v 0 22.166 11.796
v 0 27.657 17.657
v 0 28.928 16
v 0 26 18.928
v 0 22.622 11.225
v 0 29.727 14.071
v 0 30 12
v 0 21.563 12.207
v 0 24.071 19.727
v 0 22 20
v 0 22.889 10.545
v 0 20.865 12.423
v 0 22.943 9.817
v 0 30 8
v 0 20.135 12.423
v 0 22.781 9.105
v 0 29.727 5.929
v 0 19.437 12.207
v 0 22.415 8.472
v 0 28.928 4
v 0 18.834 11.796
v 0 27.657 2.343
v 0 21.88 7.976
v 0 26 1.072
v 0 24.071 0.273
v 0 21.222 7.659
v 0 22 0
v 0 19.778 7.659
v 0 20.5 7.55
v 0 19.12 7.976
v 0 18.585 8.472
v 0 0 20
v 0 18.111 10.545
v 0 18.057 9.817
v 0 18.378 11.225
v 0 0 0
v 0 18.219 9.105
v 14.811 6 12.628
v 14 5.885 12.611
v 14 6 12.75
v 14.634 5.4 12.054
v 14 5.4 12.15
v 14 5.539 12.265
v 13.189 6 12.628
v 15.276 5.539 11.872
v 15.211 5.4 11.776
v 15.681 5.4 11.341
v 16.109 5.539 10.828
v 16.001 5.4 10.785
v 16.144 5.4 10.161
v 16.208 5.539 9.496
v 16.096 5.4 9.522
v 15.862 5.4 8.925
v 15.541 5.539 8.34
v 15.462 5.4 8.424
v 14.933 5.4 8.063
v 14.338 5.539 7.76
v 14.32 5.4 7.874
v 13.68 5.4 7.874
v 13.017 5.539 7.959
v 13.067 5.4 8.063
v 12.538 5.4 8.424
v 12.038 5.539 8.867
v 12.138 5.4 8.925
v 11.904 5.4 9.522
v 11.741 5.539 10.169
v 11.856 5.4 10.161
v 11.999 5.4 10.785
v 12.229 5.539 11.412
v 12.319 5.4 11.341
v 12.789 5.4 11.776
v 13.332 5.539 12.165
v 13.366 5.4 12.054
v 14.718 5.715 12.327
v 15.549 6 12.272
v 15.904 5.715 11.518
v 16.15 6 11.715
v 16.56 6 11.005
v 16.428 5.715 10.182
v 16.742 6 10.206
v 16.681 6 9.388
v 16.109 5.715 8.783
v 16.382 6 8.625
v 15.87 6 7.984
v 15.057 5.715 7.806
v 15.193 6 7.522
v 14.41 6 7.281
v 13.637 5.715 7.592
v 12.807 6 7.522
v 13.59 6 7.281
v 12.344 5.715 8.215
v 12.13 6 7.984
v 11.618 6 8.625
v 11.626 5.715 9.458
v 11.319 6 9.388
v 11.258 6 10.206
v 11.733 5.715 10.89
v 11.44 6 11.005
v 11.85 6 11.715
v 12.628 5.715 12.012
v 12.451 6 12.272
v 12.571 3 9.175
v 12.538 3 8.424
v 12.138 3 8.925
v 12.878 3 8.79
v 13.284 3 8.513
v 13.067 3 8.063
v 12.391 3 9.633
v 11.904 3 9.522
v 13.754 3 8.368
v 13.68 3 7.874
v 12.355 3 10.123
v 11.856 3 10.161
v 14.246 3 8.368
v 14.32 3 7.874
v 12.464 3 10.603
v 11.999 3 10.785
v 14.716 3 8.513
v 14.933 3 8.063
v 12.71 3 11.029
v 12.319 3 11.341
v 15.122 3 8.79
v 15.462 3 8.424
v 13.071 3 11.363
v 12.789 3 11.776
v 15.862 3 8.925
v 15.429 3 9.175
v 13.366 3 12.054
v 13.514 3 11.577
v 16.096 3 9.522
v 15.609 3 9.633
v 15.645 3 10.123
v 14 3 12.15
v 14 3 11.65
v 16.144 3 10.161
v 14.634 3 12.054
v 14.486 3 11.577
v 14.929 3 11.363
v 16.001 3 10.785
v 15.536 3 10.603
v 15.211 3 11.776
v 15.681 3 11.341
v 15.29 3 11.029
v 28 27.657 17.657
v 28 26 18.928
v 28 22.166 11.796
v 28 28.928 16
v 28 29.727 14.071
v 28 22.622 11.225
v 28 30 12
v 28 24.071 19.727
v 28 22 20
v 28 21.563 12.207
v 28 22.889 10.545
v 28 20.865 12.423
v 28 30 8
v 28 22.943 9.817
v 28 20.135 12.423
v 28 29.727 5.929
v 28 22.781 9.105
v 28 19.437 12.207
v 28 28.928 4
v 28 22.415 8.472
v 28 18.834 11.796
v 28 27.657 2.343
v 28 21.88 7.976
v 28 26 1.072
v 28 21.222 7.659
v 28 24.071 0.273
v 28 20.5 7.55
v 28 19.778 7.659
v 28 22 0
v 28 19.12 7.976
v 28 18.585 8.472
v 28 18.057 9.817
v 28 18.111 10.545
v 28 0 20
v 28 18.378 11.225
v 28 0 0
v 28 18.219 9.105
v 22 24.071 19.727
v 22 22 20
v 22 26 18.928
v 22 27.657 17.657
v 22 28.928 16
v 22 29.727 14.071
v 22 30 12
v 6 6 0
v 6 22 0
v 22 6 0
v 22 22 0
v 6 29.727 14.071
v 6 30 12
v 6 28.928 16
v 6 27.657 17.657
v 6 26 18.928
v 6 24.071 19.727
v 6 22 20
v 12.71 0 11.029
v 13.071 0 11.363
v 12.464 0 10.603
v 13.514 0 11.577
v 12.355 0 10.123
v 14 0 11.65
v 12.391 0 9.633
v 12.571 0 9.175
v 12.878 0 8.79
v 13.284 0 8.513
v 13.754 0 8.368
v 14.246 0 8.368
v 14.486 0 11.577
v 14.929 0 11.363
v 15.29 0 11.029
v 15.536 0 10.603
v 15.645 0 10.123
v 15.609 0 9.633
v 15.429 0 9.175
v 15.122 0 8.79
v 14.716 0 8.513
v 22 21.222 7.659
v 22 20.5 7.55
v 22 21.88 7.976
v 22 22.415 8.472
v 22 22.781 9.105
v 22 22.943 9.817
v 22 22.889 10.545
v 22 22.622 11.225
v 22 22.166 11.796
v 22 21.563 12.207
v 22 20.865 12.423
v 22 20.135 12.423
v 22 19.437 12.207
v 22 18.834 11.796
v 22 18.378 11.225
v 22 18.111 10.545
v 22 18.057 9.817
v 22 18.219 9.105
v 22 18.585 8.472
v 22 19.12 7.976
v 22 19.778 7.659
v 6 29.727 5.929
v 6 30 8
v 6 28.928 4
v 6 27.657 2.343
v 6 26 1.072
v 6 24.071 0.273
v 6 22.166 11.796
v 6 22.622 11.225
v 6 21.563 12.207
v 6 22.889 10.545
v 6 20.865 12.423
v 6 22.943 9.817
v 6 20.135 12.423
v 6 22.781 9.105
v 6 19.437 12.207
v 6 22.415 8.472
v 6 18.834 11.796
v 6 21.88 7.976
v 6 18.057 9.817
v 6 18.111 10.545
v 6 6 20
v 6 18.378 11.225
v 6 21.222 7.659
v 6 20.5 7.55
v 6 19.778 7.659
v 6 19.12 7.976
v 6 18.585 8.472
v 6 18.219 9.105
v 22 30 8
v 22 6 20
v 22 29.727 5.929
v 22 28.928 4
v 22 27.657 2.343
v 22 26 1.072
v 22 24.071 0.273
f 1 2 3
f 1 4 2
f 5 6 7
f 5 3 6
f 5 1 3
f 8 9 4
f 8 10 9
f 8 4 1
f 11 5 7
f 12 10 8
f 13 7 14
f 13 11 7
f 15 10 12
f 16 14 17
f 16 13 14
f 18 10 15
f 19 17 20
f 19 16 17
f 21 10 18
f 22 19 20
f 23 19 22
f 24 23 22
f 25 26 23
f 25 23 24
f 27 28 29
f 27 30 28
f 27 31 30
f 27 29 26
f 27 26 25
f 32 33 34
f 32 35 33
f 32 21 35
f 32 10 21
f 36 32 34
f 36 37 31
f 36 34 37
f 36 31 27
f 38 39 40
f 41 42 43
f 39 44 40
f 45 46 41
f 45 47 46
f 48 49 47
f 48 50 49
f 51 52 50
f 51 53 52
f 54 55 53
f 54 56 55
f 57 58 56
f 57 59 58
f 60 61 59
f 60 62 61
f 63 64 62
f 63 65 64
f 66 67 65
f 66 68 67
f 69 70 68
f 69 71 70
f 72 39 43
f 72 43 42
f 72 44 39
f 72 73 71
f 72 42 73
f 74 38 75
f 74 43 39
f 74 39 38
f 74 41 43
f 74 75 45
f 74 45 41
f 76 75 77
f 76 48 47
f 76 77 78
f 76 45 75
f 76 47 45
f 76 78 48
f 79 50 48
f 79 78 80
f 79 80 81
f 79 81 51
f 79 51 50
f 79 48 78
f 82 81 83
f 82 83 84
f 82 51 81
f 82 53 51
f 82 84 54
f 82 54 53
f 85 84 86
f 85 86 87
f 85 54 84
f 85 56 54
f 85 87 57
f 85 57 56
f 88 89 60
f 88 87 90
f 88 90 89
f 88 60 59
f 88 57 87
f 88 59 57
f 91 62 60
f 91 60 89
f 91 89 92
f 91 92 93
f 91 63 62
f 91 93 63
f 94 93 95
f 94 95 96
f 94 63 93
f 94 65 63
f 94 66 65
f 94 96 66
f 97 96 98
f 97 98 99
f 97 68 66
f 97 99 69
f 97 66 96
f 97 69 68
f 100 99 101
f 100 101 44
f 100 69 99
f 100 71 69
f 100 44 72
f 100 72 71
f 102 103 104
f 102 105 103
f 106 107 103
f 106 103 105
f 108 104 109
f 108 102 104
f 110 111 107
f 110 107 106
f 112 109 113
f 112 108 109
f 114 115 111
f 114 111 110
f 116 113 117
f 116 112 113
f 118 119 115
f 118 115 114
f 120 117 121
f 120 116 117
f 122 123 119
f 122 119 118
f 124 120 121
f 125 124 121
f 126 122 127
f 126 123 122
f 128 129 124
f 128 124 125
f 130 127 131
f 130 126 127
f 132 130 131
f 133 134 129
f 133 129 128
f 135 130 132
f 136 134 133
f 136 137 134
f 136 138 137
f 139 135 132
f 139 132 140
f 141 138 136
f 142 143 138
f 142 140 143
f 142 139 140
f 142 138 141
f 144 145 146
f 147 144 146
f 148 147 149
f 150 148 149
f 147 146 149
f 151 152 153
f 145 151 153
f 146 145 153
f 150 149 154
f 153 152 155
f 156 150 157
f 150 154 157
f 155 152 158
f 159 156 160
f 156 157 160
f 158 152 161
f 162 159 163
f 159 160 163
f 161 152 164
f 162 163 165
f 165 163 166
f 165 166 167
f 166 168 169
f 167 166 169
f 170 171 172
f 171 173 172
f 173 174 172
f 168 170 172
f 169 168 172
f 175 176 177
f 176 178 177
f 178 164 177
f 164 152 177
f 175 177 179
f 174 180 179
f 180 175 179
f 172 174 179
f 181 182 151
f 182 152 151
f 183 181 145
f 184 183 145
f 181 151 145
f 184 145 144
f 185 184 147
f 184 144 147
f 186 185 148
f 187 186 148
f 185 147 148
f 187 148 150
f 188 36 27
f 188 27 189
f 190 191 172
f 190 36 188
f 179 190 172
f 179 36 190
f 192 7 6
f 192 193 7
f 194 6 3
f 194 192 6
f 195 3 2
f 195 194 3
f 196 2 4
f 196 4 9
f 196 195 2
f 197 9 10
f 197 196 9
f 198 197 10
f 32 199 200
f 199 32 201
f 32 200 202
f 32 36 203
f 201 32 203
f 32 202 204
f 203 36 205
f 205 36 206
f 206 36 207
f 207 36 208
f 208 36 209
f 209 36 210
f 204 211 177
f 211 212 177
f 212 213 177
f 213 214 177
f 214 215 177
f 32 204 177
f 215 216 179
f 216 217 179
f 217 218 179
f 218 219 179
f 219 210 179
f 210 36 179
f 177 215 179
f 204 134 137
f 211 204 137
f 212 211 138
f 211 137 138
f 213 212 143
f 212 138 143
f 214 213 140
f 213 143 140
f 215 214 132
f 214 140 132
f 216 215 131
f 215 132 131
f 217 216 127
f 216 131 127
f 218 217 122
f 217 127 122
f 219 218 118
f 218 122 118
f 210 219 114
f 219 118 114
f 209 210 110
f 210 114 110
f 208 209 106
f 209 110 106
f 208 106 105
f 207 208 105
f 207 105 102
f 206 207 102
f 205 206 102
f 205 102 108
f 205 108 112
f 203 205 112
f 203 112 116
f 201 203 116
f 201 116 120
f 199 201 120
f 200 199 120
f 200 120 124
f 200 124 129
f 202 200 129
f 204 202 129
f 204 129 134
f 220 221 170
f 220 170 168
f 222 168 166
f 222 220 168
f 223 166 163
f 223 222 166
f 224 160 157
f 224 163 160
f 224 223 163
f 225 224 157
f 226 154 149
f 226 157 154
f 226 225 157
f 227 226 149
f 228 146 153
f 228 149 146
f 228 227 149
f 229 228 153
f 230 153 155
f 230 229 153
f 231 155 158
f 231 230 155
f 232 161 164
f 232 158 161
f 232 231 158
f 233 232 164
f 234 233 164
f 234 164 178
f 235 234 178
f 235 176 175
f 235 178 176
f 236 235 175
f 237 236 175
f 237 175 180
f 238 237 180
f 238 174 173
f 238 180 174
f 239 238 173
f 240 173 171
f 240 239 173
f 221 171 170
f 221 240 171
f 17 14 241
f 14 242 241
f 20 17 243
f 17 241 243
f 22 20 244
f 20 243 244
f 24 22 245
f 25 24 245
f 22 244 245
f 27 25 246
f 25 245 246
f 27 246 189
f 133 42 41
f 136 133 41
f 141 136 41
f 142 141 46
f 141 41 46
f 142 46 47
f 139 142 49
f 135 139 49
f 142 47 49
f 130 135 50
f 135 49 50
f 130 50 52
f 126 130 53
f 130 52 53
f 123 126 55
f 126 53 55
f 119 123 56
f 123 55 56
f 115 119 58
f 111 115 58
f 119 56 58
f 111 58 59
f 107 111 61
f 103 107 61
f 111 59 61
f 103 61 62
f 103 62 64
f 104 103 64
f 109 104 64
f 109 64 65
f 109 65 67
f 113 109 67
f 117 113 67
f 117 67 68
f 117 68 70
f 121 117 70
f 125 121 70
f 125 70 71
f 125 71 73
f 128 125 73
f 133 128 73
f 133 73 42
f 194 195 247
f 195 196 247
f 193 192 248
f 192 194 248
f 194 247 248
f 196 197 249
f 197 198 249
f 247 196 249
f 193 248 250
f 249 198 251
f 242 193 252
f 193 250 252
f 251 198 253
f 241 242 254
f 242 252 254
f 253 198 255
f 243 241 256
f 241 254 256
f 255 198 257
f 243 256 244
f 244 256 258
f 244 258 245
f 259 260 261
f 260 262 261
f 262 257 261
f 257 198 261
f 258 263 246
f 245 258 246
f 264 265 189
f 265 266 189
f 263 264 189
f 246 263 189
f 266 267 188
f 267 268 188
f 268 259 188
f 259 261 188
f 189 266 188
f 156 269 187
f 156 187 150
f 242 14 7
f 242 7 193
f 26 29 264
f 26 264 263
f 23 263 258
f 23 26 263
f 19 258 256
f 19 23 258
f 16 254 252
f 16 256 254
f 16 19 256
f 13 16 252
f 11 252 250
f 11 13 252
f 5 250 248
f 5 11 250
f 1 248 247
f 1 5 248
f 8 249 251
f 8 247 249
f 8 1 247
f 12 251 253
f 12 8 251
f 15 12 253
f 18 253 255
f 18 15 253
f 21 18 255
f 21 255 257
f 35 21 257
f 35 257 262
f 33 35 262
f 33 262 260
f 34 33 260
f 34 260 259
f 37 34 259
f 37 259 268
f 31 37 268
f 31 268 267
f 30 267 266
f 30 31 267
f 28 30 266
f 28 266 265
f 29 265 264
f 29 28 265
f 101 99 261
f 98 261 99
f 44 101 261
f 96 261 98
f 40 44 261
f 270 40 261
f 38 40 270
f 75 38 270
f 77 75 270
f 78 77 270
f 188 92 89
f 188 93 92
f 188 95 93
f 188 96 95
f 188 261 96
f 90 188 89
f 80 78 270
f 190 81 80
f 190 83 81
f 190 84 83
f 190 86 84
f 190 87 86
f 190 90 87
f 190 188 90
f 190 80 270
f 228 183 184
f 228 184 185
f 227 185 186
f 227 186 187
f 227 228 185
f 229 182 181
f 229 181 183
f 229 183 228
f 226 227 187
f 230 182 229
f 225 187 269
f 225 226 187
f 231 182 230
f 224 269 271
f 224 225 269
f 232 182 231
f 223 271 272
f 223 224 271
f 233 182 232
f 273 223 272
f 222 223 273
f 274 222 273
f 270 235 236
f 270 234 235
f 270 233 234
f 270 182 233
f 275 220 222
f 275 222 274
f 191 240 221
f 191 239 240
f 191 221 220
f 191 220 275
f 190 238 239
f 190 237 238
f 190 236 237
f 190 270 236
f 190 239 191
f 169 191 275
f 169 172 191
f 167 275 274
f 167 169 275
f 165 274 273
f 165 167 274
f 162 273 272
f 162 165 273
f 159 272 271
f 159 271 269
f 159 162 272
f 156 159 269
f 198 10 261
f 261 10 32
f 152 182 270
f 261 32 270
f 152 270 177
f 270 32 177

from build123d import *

# Parameters (mm, degrees)
SKETCH1_W               = 28
SKETCH1_H               = 20
BOSS_EXTRUDE1_DEPTH     = 6
SKETCH2_W               = 6
SKETCH2_H               = 20
BOSS_EXTRUDE2_DEPTH     = 24
CUT_EXTRUDE1_DEPTH      = 43.237424164
CUT_EXTRUDE1_DEPTH_BACK = 43.237424164
SKETCH3_R               = 2.45
SKETCH4_R               = 1.65
CUT_EXTRUDE2_DEPTH      = 42.952353927
SKETCH5_R               = 2.15
CUT_EXTRUDE3_DEPTH      = 3
FILLET1_SIZE            = 0.6
FILLET2_R               = 8


with BuildPart() as part:
    # Sketch1 → Boss-Extrude1 (new body)
    with BuildSketch(Plane(origin=(0, 0, 0), x_dir=(1, 0, 0), z_dir=(0, 1, 0))):
        with Locations((14, -10)):
            Rectangle(SKETCH1_W, SKETCH1_H)
    extrude(amount=BOSS_EXTRUDE1_DEPTH)

    # Sketch2 → Boss-Extrude2 (add)
    with BuildSketch(Plane(origin=(0, 6, 0), x_dir=(1, 0, 0), z_dir=(0, 1, 0))):
        with Locations((3, -10)):
            Rectangle(SKETCH2_W, SKETCH2_H)
        with Locations((25, -10)):
            Rectangle(SKETCH2_W, SKETCH2_H)
    extrude(amount=BOSS_EXTRUDE2_DEPTH)

    # Sketch3 → Cut-Extrude1 (cut, two sides: drawn at the far end of the back side and taken through both)
    with BuildSketch(Plane(origin=(6, 0, 0), x_dir=(0, 0, -1), z_dir=(1, 0, 0)).offset(-CUT_EXTRUDE1_DEPTH_BACK)):
        with Locations((-10, 20.5)):
            Circle(SKETCH3_R)
    extrude(amount=CUT_EXTRUDE1_DEPTH + CUT_EXTRUDE1_DEPTH_BACK, mode=Mode.SUBTRACT)

    # Sketch4 → Cut-Extrude2 (cut, through all)
    with BuildSketch(Plane(origin=(0, 6, 0), x_dir=(1, 0, 0), z_dir=(0, 1, 0))):
        with Locations(Location((14, -10, 0), (0, 0, 270))):
            Circle(SKETCH4_R)
    extrude(amount=-CUT_EXTRUDE2_DEPTH, mode=Mode.SUBTRACT)

    # Sketch5 → Cut-Extrude3 (cut)
    with BuildSketch(Plane(origin=(0, 6, 0), x_dir=(1, 0, 0), z_dir=(0, 1, 0))):
        with Locations(Location((14, -10, 0), (0, 0, 270))):
            Circle(SKETCH5_R)
    extrude(amount=-CUT_EXTRUDE3_DEPTH, mode=Mode.SUBTRACT)

    # Fillet1
    # a fillet whose section is not a circle: 0.6 mm, written as the material it takes off along each edge
    with BuildSketch(Plane(origin=(14, 6, 10), x_dir=(0, 0, 1), z_dir=(-1, 0, 0))) as fillet1_piece_1:
        with BuildLine():
            Bezier((2.15 + FILLET1_SIZE, 0), (2.15, 0), (2.15, -FILLET1_SIZE), weights=[1, 0.052631579, 1])
            Line((2.15, -FILLET1_SIZE), (2.15, 0))
            Line((2.15, 0), (2.15 + FILLET1_SIZE, 0))
        make_face()
    revolve(axis=Axis((14, 6, 10), (0, 1, 0)), mode=Mode.SUBTRACT)

    # Fillet2
    fillet2_edges = [part.edges().sort_by_distance(p)[0] for p in [
        (3, 30, 20),
        (3, 30, 0),
        (25, 30, 0),
        (25, 30, 20),
    ]]
    fillet(fillet2_edges, radius=FILLET2_R)


solid = part.part
